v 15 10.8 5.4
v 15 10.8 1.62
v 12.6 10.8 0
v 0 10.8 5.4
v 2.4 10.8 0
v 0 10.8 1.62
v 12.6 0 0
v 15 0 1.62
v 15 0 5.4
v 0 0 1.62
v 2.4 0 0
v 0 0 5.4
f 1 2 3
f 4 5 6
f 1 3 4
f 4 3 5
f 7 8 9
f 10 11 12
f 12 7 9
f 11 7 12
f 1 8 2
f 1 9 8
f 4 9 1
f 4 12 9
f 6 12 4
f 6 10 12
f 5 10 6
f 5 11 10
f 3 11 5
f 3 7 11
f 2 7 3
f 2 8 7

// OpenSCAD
//translate([0,50,0])
//square([23,14]);

// 15.0-10.2 = 4.8

hdmiTopWidth=15.0;
hdmiBottomWidth=hdmiTopWidth*0.68;
hdmiHeight=hdmiTopWidth*0.36;
hdmiDepth=10.8;

translate([0,hdmiDepth,0])
rotate([90,0,0])
linear_extrude(hdmiDepth)
polygon(points=[
    [0,hdmiHeight]
    ,[hdmiTopWidth,hdmiHeight]
    ,[hdmiTopWidth,hdmiHeight*0.3]
    ,[hdmiTopWidth-(hdmiTopWidth-hdmiBottomWidth)/2,0]
    ,[(hdmiTopWidth-hdmiBottomWidth)/2,0]
    ,[0,hdmiHeight*0.3]
    ]);
